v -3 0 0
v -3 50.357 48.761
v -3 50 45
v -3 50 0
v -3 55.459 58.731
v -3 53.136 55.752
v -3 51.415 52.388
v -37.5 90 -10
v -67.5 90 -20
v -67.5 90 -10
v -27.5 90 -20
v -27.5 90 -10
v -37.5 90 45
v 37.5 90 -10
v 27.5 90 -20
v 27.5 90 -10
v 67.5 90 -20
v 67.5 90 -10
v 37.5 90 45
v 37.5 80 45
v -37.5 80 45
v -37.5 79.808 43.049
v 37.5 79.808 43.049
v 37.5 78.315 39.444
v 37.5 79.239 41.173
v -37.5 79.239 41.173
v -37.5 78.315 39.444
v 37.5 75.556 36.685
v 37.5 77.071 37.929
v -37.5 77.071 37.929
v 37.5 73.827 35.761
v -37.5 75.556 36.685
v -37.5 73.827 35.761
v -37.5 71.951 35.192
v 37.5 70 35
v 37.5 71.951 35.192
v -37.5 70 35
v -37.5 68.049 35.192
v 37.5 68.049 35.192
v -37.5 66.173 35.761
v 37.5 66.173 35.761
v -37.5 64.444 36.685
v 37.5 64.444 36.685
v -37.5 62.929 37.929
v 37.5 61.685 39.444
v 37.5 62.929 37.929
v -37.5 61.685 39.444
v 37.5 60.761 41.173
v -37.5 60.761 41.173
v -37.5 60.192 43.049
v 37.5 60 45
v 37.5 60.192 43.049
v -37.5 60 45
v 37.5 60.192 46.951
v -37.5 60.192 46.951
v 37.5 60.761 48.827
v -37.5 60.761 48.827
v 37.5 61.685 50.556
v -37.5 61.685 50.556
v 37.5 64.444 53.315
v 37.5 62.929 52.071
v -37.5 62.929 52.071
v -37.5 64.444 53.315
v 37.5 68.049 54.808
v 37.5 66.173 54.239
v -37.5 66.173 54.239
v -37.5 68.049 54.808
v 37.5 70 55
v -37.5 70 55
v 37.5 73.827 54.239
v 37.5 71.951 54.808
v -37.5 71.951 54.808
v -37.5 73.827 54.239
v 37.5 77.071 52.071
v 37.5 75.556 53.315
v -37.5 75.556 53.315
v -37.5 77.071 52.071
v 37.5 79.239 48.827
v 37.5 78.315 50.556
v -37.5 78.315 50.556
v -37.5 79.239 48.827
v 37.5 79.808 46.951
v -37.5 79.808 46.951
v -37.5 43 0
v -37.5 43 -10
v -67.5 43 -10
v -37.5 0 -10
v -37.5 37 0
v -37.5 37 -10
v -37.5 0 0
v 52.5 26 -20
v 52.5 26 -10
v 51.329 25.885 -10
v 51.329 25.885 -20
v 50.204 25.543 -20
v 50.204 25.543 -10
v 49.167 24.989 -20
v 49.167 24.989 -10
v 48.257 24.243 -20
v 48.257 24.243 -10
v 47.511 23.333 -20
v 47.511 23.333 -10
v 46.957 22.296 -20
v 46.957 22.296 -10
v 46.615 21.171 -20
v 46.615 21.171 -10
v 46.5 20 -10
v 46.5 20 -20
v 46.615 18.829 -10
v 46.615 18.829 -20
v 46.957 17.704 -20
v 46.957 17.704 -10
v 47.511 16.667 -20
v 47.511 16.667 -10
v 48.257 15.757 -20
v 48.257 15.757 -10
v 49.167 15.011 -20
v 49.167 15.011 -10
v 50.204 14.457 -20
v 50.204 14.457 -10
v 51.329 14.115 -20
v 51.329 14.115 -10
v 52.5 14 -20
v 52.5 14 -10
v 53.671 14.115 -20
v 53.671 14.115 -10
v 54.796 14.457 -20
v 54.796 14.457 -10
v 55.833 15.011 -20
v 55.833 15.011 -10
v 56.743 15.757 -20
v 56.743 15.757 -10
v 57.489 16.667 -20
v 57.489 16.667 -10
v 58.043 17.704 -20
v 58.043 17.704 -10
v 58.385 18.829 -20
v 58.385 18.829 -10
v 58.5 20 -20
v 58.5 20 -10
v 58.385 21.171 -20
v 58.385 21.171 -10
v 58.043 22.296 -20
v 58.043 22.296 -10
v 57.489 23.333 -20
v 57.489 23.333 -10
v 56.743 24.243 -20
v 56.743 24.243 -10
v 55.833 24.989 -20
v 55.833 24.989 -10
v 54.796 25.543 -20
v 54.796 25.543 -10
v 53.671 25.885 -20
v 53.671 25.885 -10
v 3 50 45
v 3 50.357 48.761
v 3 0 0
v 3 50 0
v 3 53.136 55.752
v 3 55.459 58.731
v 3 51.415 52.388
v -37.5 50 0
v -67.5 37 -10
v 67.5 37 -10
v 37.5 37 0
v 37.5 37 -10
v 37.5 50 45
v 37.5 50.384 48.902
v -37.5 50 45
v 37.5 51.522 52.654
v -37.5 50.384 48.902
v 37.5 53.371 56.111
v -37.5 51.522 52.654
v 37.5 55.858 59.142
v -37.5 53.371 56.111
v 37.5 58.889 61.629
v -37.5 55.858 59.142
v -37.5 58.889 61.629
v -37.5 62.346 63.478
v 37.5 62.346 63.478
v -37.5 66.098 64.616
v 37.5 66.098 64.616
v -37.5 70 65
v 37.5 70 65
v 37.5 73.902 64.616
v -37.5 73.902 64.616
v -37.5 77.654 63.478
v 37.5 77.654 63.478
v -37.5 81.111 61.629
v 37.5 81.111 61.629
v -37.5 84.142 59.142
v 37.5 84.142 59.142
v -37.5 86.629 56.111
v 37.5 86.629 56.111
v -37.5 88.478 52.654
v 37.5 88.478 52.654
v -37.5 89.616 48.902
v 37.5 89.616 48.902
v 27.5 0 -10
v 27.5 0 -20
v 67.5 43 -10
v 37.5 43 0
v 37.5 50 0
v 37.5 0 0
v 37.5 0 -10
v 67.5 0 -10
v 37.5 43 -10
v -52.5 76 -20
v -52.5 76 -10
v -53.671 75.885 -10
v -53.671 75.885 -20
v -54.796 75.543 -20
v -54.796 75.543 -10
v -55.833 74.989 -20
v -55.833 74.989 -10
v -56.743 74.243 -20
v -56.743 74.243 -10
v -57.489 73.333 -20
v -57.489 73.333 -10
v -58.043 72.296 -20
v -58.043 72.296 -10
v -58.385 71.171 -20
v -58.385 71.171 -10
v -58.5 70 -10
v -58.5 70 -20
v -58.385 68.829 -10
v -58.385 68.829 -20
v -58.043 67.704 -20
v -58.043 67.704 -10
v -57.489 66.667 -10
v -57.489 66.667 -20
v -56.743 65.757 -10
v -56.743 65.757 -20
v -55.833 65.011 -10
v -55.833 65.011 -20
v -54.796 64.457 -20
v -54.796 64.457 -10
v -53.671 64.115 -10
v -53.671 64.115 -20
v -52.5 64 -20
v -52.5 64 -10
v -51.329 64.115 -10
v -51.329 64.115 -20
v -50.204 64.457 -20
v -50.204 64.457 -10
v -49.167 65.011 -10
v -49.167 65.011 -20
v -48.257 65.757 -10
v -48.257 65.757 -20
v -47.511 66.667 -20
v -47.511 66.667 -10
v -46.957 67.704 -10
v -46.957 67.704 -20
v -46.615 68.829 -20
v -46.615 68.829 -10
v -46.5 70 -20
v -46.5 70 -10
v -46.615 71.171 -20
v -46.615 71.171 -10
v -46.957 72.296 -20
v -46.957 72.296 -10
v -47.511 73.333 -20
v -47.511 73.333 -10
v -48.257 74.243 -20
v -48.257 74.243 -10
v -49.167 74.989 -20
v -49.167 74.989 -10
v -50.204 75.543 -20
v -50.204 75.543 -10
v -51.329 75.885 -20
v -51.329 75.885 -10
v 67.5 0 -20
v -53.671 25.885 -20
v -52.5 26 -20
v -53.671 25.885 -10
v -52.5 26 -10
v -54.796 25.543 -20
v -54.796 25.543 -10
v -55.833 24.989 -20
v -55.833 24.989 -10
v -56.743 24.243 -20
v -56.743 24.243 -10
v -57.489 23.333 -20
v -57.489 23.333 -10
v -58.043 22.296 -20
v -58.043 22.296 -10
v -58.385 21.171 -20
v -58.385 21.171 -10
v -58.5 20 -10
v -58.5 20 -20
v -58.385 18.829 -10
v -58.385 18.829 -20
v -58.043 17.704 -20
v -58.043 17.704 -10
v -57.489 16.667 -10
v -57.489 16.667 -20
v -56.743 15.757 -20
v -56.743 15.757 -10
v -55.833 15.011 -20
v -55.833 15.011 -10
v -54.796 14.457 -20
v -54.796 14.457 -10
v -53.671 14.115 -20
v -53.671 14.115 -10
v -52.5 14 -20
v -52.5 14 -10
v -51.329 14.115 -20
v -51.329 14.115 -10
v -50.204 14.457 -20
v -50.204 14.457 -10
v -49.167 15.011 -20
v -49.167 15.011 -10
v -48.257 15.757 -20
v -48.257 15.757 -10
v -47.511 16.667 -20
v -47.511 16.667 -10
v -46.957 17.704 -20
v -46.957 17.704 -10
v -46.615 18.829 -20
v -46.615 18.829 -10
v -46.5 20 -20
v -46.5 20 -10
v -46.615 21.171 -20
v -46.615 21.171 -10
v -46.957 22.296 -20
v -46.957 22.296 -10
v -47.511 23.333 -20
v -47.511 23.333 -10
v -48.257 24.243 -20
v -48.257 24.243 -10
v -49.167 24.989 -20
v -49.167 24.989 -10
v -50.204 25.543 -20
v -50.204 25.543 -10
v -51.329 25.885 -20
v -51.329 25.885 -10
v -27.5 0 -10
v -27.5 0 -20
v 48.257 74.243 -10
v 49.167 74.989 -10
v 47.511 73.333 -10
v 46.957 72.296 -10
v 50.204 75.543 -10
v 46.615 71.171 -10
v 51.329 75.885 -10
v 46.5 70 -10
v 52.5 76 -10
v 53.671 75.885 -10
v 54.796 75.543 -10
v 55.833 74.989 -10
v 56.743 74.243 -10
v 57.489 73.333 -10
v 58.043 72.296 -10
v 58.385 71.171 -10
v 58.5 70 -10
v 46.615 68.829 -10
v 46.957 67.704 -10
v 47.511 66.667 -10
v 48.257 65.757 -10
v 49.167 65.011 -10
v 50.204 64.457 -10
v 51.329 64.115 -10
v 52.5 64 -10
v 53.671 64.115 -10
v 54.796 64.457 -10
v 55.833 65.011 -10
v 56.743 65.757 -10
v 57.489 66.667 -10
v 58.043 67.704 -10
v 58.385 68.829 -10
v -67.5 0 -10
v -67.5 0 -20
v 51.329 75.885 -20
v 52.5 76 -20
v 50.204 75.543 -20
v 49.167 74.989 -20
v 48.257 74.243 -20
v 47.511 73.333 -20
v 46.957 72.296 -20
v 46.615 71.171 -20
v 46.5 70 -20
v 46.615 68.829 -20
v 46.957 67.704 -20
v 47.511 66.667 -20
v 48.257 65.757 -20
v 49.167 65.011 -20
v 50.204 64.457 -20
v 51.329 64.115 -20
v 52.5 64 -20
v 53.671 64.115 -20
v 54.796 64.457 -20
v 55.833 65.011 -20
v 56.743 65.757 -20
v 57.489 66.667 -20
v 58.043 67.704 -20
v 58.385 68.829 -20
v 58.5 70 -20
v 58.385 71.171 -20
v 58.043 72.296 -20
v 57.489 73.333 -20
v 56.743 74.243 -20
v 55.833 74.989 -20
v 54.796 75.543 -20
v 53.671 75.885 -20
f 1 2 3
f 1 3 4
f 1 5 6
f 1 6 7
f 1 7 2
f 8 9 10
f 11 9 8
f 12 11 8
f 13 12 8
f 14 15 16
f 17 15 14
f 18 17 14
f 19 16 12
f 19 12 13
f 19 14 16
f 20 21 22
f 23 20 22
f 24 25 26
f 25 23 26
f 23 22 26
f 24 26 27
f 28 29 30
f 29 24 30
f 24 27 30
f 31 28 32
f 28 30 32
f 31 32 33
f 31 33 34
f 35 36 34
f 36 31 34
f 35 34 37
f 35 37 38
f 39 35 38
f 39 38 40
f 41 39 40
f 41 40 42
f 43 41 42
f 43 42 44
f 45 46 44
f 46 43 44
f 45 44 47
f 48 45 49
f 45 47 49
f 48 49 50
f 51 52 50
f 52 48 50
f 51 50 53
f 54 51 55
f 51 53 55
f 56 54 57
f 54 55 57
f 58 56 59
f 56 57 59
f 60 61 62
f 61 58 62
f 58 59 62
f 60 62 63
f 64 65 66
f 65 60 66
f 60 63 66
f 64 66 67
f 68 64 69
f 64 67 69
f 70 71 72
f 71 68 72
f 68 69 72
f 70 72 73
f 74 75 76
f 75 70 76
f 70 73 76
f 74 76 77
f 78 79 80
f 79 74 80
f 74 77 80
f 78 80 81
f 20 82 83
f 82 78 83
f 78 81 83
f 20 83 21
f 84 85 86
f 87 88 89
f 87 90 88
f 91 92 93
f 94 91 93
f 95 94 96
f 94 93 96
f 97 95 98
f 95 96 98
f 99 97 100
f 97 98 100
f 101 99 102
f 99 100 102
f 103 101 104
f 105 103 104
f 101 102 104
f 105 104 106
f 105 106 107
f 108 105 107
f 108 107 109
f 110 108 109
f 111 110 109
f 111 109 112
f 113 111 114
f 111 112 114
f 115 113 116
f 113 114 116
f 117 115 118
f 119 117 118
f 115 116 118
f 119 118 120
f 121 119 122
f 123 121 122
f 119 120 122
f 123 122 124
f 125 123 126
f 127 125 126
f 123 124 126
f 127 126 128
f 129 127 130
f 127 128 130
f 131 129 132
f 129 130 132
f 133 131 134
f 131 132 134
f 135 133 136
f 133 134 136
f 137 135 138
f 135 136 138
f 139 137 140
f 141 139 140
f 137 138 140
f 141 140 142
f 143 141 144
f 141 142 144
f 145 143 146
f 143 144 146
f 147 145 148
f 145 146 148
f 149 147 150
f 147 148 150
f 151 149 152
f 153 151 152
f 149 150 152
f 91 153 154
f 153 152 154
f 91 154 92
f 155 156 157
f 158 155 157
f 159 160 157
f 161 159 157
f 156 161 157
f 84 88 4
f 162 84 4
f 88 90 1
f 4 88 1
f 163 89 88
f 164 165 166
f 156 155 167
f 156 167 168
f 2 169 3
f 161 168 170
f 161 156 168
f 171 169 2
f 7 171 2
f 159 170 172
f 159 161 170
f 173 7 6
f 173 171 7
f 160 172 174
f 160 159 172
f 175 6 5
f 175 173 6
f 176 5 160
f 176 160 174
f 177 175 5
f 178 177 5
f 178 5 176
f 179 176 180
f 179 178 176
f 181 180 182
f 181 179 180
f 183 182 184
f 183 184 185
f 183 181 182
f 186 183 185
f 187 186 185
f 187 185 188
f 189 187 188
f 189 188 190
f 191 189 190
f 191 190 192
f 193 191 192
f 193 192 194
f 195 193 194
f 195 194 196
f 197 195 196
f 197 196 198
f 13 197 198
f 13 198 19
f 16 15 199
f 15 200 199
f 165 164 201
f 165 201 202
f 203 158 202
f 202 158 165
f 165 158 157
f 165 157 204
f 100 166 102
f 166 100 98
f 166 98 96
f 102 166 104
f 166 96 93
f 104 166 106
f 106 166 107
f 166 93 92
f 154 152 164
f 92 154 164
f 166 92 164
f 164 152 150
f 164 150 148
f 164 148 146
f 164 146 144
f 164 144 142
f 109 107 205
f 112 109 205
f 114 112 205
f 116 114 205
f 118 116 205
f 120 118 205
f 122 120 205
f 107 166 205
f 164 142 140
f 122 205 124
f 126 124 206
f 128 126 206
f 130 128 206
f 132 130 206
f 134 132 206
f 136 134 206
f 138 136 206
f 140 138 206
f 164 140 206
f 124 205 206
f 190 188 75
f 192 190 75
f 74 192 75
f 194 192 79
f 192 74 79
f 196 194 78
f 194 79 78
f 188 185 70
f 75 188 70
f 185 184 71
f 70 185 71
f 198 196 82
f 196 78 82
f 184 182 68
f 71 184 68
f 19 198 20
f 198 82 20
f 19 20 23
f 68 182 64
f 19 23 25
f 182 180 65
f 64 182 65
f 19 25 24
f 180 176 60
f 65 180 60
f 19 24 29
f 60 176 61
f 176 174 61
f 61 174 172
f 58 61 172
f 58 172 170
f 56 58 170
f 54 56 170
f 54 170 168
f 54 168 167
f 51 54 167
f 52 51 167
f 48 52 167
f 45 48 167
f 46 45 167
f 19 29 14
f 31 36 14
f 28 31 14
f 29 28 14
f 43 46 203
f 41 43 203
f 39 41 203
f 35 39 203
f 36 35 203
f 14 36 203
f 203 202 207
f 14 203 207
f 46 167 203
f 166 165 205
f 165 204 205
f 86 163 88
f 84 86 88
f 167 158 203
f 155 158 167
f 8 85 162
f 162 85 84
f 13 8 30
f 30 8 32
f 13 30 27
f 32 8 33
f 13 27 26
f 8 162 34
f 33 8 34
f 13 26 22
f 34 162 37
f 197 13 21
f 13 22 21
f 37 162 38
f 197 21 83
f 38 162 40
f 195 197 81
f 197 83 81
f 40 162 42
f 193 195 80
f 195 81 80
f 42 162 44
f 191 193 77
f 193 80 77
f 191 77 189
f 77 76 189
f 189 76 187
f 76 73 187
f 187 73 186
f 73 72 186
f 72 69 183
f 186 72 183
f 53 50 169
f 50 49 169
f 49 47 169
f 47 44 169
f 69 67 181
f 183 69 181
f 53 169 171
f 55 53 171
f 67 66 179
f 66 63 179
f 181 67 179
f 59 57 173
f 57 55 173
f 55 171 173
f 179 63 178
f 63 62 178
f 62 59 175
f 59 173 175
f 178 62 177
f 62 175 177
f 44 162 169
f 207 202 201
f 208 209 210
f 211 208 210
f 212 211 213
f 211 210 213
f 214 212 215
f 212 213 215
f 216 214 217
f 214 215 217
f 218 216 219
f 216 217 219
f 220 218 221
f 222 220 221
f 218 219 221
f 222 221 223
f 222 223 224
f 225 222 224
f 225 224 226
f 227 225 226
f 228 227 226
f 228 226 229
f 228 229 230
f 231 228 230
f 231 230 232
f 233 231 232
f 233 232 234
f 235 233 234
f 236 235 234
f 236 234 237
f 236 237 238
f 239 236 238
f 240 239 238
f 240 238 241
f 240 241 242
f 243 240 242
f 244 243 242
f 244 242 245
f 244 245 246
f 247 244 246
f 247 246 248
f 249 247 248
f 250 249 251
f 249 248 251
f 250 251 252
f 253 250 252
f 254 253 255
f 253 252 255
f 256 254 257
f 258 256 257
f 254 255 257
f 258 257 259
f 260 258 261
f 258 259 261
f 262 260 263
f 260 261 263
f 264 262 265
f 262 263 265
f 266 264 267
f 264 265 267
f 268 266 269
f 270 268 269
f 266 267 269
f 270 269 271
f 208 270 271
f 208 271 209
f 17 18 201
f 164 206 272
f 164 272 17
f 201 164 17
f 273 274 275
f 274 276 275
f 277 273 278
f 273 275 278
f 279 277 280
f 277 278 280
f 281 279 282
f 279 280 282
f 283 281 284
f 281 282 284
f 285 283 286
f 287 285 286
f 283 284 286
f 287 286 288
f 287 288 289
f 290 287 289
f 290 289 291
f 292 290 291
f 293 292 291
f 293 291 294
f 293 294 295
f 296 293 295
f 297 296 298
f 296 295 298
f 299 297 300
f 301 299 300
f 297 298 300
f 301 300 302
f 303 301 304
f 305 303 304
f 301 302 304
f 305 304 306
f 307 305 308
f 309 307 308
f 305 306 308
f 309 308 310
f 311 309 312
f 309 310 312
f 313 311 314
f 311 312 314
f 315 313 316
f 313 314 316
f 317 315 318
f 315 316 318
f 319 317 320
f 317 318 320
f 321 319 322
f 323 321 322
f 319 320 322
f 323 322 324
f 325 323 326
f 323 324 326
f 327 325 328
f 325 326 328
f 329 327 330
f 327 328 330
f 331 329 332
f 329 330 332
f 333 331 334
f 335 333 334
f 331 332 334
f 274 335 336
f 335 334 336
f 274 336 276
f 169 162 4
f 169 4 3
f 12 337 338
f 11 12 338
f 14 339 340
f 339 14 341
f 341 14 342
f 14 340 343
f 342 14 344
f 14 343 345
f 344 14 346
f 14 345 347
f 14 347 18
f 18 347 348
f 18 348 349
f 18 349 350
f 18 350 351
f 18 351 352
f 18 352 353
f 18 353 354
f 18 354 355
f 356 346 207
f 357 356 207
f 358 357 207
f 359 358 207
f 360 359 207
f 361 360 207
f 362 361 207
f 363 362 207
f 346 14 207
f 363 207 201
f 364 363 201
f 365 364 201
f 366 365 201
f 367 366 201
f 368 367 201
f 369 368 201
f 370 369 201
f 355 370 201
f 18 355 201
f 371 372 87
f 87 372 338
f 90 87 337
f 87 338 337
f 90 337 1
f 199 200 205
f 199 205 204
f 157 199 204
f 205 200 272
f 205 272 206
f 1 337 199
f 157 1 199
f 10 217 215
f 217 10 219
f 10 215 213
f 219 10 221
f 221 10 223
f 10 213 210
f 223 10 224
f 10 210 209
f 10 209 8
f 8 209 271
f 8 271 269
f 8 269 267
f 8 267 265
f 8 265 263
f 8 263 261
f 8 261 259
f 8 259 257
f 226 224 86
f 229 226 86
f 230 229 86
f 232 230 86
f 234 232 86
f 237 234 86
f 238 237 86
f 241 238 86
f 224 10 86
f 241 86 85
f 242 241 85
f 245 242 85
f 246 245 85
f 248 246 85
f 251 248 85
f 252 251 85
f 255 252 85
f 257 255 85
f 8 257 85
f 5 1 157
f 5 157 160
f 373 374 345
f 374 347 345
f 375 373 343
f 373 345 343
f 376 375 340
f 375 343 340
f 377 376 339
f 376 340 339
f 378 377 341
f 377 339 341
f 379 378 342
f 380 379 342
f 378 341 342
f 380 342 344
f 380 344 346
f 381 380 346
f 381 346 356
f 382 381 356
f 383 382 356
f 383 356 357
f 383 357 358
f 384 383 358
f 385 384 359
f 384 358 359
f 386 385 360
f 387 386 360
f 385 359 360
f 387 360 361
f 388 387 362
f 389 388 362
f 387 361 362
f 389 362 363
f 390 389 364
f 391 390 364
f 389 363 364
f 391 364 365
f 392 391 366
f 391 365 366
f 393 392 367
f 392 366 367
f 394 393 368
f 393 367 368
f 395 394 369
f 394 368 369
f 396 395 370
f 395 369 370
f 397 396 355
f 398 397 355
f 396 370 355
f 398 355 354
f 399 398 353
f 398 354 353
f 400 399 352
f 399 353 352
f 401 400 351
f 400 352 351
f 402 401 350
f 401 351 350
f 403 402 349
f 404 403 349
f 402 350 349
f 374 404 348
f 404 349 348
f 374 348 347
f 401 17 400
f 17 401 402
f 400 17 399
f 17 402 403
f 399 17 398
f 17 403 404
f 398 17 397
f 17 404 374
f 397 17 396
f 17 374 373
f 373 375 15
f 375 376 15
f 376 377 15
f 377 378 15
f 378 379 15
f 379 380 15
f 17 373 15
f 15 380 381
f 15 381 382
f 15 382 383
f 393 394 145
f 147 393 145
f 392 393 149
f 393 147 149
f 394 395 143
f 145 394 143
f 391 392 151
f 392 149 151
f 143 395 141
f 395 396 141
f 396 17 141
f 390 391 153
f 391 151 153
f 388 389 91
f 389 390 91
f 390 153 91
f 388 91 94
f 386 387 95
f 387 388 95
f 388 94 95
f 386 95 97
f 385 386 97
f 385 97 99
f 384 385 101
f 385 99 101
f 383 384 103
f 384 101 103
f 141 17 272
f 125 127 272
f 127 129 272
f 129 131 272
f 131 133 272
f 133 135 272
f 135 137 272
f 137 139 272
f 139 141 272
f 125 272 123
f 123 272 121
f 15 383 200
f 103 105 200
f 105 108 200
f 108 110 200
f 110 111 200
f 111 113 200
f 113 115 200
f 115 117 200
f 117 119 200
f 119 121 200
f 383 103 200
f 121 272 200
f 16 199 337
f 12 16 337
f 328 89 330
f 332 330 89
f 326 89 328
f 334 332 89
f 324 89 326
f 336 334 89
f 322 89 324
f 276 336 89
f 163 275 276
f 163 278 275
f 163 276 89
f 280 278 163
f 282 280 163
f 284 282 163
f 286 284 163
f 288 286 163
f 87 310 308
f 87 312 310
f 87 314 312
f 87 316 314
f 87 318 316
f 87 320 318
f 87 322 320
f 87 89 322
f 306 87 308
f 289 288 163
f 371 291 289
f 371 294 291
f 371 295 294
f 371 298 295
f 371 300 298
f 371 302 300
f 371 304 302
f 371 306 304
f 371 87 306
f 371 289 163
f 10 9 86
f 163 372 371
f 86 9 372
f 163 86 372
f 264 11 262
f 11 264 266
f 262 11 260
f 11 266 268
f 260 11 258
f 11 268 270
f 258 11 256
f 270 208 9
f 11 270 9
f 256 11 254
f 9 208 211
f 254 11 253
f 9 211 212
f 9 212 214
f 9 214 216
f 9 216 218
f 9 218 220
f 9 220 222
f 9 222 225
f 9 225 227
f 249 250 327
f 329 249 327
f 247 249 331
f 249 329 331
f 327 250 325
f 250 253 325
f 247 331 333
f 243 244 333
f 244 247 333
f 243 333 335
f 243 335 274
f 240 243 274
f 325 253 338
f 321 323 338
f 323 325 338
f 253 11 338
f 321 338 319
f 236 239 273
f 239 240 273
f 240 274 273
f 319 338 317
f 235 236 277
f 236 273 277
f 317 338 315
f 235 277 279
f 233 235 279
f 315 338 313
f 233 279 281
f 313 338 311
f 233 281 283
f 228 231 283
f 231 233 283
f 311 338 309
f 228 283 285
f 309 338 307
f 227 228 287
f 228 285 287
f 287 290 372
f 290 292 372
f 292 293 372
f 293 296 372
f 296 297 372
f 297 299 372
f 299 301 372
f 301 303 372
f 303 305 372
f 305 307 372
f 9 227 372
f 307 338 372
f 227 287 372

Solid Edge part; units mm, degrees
sketch "Sketch1" plane through (0, 0, 0) normal (0, -1, 0) x (1, 0, 0)
  line L0 (67.5, -10) -> (67.5, -20)
  line L1 (67.5, -20) -> (27.5, -20)
  line L2 (27.5, -20) -> (27.5, -10)
  line L3 (27.5, -10) -> (3, -10)
  line L4 (3, -10) -> (0, -10)
  line L5 (0, -10) -> (-3, -10)
  line L6 (-3, -10) -> (-27.5, -10)
  line L7 (-27.5, -10) -> (-27.5, -20)
  line L8 (-27.5, -20) -> (-37.5, -20)
  line L9 (-37.5, -20) -> (-52.5, -20)
  line L10 (-52.5, -20) -> (-67.5, -20)
  line L11 (-67.5, -20) -> (-67.5, -10)
  line L12 (-67.5, -10) -> (-37.5, -10)
  line L13 (-37.5, -10) -> (-37.5, 0)
  line L14 (-37.5, 0) -> (-27.5, 0)
  line L15 (-27.5, 0) -> (-15.8209, 0)
  line L16 (-15.8209, 0) -> (0, 0)
  line L17 (0, 0) -> (3, 0)
  line L18 (3, 0) -> (27.5, 0)
  line L19 (27.5, 0) -> (37.5, 0)
  line L20 (37.5, 0) -> (37.5, -10)
  line L21 (37.5, -10) -> (52.5, -10)
  line L22 (52.5, -10) -> (67.5, -10)
extrude "Protrusion1" add sketch "Sketch1" against normal blind 90
sketch "Sketch2" plane through (0, 0, 0) normal (1, 0, 0) x (0, 1, 0)
  line L0 (90, 45) -> (90, 0)
  line L1 (90, 0) -> (50, 0)
  line L2 (50, 0) -> (50, 45)
  arc A0 (50, 45) -> (90, 45) centre (70, 45) cw
extrude "ExtrudedProtrusion_5" add sketch "Sketch2" along normal mid plane 75
sketch "Sketch3" plane through (0, 0, 0) normal (1, 0, 0) x (0, 1, 0)
  circle A0 centre (70, 45) radius 10
extrude "ExtrudedCutout_1" cut sketch "Sketch3" along normal mid plane 75
sketch "Sketch4" plane through (0, 0, 0) normal (1, 0, 0) x (0, 1, 0)
  line L0 (0, 0) -> (55.4585, 58.7312)
  line L1 (50, 45) -> (50, 0)
  line L2 (50, 0) -> (0, 0)
  arc A0 (50, 45) -> (55.4585, 58.7312) centre (70, 45) cw
extrude "ExtrudedProtrusion_6" add sketch "Sketch4" along normal mid plane 6
sketch "Sketch5" plane through (0, 0, -10) normal (0, -1, 0) x (1, 0, 0)
  line L0 (67.5, 0) -> (37.5, 10)
  line L1 (37.5, 10) -> (37.5, 0)
  line L2 (37.5, 0) -> (67.5, 0)
extrude "ExtrudedProtrusion_7" add sketch "Sketch5" against normal blind 43
sketch "Sketch6" plane through (0, 0, -10) normal (0, -1, 0) x (1, 0, 0)
  line L0 (67.5, 0) -> (37.5, 10)
  line L1 (37.5, 10) -> (37.5, 0)
  line L2 (37.5, 0) -> (67.5, 0)
extrude "ExtrudedCutout_2" cut sketch "Sketch6" against normal blind 37
sketch "Sketch7" plane through (0, 0, -10) normal (0, -1, 0) x (1, 0, 0)
  line L0 (-67.5, 0) -> (-37.5, 10)
  line L1 (-37.5, 10) -> (-37.5, 0)
  line L2 (-37.5, 0) -> (-67.5, 0)
extrude "ExtrudedProtrusion_8" add sketch "Sketch7" against normal blind 43
sketch "Sketch8" plane through (0, 0, -10) normal (0, -1, 0) x (1, 0, 0)
  line L0 (-67.5, 0) -> (-37.5, 10)
  line L1 (-37.5, 10) -> (-37.5, 0)
  line L2 (-37.5, 0) -> (-67.5, 0)
extrude "ExtrudedCutout_3" cut sketch "Sketch8" against normal blind 37
sketch "Sketch9" plane through (52.5, 18.5, -10) normal (0, 0, 1) x (0, 1, 0)
  circle A0 centre (1.5, 0) radius 6
extrude "ExtrudedCutout_4" cut sketch "Sketch9" against normal blind 10
sketch "Sketch10" plane through (52.5, 18.5, -10) normal (0, 0, 1) x (0, 1, 0)
  circle A0 centre (51.5, 0) radius 6
extrude "ExtrudedCutout_5" cut sketch "Sketch10" against normal blind 10
sketch "Sketch11" plane through (52.5, 18.5, -10) normal (0, 0, 1) x (0, 1, 0)
  circle A0 centre (51.5, 105) radius 6
extrude "ExtrudedCutout_6" cut sketch "Sketch11" against normal blind 10
sketch "Sketch12" plane through (52.5, 18.5, -10) normal (0, 0, 1) x (0, 1, 0)
  circle A0 centre (1.5, 105) radius 6
extrude "ExtrudedCutout_8" cut sketch "Sketch12" against normal blind 10
